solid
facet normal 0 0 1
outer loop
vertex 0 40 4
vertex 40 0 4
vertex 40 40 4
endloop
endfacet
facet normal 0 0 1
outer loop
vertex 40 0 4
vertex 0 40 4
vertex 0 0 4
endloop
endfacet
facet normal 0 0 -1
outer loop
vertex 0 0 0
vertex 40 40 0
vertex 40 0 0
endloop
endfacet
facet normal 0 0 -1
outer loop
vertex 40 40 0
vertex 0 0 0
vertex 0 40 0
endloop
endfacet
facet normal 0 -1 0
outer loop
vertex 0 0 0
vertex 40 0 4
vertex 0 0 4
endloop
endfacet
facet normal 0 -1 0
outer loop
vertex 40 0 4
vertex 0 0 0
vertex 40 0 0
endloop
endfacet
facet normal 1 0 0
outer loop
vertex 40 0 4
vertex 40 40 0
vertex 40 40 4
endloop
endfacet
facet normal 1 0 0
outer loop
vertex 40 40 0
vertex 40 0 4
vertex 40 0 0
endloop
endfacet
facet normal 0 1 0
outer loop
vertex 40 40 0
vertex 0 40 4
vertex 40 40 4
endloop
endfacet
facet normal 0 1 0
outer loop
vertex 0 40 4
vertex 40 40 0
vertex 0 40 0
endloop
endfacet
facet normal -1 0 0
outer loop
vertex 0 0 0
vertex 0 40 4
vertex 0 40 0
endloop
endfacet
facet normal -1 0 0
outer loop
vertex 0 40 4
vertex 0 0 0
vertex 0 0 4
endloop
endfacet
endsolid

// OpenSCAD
// SPDX-License-Identifier: CC-BY-NC-SA-4.0
// lid part — the box lid.
module lid() {
    cube([40, 40, 4]);
}

lid();
